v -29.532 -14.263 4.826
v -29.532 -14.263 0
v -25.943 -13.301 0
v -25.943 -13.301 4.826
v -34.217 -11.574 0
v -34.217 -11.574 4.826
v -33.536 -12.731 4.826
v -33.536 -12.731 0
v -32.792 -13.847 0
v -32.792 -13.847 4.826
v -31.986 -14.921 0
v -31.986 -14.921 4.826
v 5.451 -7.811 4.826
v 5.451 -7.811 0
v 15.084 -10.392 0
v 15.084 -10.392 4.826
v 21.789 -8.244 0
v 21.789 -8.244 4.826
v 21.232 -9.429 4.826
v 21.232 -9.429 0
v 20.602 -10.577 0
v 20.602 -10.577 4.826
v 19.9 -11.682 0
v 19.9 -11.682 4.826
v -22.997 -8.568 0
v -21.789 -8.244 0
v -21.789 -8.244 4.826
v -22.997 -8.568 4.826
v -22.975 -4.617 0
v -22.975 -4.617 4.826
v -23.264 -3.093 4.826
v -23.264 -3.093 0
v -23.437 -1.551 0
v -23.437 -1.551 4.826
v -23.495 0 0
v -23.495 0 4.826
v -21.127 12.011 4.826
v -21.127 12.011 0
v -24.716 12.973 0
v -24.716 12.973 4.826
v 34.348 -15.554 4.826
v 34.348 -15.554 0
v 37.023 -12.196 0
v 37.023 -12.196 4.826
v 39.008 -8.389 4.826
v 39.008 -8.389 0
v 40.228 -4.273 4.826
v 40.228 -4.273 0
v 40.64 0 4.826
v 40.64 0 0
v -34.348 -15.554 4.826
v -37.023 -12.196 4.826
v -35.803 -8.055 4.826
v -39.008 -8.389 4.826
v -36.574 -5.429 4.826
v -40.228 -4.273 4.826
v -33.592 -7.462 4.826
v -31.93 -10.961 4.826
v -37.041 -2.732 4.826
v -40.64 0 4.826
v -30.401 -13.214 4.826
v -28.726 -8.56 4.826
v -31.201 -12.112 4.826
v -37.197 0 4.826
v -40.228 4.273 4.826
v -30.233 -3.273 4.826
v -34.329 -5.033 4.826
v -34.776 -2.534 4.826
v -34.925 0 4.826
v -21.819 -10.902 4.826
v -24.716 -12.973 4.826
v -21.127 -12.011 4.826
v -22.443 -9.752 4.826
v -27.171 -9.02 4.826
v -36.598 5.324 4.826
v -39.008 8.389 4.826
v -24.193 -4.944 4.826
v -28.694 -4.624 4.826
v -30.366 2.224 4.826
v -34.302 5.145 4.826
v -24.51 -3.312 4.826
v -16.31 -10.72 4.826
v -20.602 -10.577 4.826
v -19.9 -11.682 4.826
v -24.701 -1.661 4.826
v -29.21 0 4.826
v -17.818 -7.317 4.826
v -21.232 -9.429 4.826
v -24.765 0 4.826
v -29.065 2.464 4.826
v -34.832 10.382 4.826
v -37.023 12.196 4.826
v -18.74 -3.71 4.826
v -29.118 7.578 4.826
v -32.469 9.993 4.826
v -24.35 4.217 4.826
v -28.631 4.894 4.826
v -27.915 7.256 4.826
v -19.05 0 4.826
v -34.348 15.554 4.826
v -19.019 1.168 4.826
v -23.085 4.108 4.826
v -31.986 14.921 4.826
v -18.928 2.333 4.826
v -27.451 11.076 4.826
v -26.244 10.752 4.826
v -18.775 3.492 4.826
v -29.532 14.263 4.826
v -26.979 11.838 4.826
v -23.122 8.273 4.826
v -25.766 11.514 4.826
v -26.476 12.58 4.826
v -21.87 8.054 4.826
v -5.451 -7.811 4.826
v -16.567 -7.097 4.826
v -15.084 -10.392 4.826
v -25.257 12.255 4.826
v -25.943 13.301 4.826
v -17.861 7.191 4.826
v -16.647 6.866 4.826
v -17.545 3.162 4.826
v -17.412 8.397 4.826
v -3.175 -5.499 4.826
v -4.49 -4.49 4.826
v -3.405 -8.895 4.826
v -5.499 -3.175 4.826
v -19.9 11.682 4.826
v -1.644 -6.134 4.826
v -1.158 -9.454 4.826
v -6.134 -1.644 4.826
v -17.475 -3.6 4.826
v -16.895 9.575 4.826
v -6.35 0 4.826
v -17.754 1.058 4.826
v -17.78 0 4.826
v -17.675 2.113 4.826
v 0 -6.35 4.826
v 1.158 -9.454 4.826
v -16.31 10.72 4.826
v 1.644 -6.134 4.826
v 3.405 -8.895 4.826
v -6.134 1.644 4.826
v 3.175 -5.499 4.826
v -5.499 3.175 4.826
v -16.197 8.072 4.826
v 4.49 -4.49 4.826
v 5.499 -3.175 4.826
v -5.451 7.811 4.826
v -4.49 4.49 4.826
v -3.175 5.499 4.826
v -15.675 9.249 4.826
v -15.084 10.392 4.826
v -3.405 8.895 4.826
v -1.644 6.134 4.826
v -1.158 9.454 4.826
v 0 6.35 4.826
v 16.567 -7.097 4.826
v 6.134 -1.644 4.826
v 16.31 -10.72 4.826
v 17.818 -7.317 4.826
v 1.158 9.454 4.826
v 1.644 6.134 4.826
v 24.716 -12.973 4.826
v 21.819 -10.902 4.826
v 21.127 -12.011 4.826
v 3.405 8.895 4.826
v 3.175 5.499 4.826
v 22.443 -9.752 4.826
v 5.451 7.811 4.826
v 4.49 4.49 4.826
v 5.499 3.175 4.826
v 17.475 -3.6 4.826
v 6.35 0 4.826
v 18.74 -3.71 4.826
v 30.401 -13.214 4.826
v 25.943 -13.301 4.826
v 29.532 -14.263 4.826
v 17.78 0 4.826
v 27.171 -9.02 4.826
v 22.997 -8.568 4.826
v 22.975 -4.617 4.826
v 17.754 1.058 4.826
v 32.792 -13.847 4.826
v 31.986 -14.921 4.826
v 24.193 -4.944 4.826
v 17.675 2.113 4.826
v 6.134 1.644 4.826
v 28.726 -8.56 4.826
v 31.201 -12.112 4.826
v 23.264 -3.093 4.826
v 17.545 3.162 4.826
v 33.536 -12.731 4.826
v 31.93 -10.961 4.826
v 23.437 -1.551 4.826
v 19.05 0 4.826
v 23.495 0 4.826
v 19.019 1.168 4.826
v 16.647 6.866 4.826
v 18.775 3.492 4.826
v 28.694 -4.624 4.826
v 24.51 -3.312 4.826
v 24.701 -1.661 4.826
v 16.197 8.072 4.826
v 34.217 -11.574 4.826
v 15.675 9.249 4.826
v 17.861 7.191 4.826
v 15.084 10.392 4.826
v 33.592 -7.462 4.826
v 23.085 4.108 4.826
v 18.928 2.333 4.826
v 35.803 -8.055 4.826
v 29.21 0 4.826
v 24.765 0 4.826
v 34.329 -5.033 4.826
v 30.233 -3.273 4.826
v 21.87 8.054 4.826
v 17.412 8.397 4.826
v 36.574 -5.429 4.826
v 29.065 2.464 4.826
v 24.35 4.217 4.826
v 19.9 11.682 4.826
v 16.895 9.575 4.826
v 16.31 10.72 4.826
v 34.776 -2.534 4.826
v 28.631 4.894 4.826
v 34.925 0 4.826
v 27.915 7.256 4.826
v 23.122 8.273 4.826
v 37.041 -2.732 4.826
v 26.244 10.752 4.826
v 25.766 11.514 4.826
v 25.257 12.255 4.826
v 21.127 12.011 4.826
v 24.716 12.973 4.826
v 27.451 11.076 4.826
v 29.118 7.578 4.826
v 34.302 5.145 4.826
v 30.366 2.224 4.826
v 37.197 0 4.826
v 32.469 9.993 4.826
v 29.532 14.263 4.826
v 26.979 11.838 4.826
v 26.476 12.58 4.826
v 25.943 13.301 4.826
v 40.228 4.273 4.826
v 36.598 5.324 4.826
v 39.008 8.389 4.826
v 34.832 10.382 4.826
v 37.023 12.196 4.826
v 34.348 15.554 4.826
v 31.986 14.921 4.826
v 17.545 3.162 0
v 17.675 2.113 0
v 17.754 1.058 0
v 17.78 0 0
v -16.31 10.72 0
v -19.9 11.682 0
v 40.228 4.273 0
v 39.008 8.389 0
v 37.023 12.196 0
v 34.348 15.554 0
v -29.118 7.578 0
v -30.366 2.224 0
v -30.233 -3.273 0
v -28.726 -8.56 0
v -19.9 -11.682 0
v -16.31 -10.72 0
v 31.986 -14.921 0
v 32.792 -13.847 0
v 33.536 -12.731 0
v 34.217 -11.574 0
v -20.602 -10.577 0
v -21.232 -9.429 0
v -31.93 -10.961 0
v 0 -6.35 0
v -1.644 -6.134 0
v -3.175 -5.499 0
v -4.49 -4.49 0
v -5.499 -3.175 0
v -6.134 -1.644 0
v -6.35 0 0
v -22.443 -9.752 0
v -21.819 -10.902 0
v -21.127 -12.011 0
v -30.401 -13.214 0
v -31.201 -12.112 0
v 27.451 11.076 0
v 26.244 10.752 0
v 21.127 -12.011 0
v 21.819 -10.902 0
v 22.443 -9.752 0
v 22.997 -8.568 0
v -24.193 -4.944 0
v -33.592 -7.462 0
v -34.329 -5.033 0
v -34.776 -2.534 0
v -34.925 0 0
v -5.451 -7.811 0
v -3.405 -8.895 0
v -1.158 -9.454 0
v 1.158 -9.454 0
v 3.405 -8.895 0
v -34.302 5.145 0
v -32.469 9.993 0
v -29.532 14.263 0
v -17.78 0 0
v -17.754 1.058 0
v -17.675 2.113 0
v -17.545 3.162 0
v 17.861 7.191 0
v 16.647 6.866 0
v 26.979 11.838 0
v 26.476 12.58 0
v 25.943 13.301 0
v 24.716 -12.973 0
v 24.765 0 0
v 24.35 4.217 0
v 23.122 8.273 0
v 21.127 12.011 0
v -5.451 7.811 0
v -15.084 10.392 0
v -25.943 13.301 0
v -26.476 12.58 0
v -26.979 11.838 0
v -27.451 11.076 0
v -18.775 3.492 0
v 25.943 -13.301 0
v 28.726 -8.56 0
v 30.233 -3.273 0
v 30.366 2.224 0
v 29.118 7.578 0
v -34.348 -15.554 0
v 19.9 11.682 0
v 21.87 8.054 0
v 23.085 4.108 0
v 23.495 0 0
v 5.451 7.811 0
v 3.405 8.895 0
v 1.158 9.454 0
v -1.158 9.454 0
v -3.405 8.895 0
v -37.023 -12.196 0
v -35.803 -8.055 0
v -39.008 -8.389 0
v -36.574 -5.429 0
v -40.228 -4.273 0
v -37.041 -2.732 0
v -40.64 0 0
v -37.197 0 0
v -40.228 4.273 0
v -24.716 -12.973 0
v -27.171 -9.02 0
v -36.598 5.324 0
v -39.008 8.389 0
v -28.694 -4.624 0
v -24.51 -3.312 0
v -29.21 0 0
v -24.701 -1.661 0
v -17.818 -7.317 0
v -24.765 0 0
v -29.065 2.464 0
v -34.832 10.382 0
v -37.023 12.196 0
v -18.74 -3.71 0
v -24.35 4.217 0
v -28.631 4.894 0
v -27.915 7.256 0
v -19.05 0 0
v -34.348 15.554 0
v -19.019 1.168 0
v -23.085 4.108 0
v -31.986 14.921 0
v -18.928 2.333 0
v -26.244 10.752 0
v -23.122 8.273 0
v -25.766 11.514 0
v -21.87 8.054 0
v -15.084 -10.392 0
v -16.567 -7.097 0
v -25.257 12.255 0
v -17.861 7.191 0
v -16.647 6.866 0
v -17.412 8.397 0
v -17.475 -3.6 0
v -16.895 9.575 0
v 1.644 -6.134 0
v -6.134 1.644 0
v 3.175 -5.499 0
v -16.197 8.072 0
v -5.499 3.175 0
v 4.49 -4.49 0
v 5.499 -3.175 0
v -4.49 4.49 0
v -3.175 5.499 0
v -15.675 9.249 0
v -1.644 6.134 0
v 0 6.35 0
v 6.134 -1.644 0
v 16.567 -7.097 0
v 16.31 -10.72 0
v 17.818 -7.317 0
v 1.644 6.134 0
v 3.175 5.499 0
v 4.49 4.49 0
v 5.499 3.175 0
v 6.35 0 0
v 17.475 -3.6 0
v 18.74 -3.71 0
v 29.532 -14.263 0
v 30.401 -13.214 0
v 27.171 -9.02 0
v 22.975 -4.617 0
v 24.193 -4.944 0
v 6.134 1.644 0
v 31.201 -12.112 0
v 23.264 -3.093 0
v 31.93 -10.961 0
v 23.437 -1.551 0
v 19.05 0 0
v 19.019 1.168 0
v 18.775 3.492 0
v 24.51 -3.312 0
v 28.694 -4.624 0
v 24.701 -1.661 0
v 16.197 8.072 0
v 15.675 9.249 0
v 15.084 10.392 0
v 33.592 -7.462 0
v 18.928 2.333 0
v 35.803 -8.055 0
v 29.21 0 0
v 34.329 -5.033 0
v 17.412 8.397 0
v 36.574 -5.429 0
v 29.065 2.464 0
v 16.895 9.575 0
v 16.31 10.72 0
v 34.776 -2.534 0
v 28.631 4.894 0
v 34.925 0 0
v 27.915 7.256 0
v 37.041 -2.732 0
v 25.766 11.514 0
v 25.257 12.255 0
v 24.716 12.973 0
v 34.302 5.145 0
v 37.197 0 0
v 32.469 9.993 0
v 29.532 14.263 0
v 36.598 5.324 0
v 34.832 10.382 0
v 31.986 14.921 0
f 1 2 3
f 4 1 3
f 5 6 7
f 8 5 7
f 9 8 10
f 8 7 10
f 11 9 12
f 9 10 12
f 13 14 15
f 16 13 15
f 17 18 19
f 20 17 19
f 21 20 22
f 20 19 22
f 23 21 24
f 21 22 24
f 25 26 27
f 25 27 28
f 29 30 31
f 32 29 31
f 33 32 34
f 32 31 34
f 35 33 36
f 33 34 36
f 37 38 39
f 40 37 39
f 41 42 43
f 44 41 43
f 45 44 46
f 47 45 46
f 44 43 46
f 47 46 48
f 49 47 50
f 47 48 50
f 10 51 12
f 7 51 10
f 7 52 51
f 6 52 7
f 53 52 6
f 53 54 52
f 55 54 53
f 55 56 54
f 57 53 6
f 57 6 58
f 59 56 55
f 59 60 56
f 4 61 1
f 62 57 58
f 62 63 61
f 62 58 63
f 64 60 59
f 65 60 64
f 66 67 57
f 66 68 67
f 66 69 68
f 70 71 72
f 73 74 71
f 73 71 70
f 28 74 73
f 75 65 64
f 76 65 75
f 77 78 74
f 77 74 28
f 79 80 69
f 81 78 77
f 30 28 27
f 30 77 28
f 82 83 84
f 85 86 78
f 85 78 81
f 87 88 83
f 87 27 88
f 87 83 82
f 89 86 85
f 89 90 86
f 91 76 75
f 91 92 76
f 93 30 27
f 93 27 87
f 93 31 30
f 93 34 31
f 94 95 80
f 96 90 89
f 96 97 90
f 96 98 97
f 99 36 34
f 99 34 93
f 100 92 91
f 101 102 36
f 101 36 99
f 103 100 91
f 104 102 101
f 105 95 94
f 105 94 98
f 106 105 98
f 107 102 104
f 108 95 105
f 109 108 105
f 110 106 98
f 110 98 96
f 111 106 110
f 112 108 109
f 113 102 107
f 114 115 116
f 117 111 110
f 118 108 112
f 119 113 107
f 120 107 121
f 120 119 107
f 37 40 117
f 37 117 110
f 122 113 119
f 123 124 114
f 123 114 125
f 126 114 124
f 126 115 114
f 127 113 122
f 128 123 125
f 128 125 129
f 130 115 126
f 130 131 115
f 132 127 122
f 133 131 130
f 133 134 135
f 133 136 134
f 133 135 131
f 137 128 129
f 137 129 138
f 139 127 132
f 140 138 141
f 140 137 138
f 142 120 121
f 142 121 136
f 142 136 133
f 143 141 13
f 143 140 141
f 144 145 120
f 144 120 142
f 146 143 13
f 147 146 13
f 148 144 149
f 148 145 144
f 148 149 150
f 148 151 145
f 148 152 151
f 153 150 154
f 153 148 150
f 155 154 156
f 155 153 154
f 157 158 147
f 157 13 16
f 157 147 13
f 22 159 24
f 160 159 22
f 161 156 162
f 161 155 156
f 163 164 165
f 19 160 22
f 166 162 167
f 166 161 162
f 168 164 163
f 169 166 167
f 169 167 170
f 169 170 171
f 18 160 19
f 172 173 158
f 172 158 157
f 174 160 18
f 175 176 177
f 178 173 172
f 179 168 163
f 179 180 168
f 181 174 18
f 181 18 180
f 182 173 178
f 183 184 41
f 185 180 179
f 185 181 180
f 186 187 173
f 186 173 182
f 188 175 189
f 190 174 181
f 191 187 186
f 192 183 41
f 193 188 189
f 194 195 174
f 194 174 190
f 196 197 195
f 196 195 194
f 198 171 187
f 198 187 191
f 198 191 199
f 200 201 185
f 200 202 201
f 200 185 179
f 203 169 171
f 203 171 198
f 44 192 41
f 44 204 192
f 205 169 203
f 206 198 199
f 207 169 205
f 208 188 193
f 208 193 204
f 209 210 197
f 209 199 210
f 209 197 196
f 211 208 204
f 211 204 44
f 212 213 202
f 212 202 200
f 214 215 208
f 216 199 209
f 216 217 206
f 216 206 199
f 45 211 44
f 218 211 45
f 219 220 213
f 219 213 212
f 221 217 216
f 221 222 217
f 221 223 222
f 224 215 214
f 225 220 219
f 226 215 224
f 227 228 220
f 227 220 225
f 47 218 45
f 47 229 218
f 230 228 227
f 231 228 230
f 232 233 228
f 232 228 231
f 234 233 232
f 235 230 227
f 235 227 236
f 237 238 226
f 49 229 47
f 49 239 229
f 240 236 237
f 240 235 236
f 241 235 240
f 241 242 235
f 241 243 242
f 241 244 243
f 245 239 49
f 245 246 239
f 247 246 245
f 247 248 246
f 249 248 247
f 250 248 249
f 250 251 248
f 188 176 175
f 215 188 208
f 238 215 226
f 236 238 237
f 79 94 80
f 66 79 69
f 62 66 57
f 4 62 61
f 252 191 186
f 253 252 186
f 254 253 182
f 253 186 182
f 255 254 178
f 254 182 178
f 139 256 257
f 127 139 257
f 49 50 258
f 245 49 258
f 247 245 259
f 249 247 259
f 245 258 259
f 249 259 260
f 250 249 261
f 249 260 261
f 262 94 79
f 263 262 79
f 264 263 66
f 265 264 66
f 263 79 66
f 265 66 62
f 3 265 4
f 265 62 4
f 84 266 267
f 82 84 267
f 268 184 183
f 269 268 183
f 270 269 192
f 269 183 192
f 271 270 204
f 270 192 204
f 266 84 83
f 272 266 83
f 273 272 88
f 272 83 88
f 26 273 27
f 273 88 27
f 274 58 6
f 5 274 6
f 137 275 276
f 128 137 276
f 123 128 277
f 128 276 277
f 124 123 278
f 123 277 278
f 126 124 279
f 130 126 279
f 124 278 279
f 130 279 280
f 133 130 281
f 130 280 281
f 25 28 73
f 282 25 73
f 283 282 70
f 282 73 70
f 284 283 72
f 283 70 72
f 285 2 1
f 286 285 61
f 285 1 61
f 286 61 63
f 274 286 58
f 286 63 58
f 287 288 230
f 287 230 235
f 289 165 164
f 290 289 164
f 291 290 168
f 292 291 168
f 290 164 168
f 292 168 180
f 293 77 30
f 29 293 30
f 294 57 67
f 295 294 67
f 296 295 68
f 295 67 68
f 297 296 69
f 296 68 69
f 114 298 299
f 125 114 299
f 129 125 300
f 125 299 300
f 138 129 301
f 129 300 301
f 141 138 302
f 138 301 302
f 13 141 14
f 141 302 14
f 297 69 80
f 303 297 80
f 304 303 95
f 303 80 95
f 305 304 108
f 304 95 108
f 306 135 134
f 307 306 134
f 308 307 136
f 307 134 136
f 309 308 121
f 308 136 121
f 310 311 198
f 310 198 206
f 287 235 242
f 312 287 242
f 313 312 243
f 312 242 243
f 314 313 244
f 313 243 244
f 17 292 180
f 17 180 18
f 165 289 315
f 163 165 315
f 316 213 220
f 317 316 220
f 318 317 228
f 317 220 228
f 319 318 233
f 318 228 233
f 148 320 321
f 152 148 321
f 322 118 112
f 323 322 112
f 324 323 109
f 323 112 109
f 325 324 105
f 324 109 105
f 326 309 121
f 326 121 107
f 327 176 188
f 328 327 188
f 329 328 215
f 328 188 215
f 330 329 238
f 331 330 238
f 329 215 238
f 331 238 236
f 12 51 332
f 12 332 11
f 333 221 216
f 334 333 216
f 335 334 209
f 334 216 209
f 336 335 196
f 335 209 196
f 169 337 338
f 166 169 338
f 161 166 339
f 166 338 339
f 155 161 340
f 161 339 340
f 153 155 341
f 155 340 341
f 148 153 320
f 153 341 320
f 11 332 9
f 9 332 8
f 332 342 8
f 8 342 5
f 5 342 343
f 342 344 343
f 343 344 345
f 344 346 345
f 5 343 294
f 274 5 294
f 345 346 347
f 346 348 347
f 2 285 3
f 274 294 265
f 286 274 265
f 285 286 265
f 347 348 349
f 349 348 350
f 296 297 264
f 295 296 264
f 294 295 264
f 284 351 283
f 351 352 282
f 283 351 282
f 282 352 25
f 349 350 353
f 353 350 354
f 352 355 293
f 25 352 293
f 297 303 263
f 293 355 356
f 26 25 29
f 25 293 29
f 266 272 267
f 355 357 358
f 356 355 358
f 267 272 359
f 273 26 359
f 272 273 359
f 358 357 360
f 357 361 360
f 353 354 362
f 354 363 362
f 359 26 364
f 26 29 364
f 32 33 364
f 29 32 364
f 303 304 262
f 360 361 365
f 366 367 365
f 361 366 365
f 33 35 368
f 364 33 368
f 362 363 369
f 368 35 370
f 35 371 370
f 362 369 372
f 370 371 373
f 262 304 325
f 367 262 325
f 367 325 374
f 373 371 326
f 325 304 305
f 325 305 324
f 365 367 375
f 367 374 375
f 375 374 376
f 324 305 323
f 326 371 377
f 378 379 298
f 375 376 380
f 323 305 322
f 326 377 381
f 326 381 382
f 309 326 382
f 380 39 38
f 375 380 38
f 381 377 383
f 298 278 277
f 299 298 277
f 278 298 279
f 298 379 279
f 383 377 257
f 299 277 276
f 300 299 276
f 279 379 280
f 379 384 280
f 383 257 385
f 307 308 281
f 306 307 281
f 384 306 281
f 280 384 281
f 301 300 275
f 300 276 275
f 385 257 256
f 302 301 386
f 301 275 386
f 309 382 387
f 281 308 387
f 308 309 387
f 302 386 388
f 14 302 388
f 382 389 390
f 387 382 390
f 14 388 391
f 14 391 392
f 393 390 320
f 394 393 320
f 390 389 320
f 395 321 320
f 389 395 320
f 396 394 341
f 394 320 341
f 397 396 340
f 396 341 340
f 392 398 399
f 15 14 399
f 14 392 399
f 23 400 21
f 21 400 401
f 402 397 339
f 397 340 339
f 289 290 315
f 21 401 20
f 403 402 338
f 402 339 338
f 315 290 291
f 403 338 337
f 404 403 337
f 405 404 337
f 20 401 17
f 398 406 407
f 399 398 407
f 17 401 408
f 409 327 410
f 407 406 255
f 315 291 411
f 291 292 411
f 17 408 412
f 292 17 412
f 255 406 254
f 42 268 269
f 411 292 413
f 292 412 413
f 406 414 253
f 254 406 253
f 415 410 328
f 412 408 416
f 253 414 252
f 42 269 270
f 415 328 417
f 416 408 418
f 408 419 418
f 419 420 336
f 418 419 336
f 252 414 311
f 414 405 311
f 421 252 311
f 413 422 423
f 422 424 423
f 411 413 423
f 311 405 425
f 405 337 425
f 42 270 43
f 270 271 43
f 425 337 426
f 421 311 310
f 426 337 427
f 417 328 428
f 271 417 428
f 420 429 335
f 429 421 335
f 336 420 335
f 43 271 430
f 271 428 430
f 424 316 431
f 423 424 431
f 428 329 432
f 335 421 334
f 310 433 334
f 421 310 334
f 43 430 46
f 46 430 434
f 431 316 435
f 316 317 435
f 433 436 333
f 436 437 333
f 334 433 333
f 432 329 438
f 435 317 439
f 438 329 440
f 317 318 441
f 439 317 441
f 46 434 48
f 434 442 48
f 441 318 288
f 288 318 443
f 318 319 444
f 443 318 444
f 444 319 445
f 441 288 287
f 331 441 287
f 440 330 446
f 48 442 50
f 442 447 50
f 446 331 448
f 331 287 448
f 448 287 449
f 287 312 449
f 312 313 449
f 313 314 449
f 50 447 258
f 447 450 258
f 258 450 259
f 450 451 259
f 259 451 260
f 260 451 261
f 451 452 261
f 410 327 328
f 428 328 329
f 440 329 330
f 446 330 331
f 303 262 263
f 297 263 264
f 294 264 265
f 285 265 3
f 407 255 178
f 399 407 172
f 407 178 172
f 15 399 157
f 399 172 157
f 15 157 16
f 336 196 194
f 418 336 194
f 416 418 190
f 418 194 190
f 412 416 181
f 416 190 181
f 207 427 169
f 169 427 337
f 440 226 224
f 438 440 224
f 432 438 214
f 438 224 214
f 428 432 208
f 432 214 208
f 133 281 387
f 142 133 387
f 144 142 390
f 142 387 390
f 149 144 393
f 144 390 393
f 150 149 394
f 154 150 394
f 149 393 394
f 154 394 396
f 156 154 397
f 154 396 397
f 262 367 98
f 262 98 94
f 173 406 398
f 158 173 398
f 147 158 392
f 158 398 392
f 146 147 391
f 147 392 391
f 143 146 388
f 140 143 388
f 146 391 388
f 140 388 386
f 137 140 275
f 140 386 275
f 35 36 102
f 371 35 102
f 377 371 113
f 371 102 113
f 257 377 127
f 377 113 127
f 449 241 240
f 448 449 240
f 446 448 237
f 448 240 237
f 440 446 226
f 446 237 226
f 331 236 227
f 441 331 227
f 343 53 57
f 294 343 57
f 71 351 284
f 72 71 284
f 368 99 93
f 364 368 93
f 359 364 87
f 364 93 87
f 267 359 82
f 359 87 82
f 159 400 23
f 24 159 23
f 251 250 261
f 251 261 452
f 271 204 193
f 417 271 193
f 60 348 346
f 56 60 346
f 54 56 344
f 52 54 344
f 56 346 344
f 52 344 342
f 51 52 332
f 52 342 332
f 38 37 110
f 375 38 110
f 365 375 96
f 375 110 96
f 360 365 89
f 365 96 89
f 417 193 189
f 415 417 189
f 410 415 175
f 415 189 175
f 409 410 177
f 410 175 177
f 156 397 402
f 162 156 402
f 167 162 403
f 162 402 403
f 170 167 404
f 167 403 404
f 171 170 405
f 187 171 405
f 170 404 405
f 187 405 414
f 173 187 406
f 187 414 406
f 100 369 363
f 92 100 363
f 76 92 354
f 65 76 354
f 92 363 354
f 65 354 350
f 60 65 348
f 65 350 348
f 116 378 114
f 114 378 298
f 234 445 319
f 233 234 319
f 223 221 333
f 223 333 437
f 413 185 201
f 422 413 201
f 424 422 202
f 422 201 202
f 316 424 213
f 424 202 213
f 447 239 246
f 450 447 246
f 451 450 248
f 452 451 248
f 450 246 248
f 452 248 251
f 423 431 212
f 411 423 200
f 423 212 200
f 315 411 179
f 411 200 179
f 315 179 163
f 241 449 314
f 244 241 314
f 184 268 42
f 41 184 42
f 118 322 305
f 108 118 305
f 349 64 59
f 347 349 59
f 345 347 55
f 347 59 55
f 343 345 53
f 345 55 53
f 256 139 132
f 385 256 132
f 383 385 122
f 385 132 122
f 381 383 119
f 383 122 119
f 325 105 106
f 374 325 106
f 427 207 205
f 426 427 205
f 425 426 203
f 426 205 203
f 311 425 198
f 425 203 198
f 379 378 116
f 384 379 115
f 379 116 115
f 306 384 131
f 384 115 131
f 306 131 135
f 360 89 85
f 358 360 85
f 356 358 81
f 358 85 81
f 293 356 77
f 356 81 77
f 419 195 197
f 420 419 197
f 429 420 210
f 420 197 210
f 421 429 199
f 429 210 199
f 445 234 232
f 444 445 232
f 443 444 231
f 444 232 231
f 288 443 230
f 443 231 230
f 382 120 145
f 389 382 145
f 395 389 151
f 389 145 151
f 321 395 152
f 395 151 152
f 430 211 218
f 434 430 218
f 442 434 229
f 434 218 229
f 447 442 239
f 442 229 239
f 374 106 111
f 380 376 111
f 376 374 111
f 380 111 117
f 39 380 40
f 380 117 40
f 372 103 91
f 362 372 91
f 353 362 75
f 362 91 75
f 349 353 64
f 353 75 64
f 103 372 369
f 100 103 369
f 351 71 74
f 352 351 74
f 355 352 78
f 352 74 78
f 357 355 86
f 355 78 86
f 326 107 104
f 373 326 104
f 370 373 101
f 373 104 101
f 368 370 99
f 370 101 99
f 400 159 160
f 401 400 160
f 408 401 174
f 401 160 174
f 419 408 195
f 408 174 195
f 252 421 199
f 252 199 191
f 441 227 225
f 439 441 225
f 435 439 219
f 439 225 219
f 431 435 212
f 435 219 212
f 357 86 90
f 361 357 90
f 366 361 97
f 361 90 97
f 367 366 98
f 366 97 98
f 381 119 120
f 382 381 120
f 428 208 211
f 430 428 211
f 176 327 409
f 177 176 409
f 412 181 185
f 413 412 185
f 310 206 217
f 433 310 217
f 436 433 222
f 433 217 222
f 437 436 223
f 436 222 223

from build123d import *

# Parameters (mm, degrees)
F1_DEPTH = 4.826
F3_DEPTH = 25.4


with BuildPart() as f1:
    # F0 (on Top) → F1 (new body)
    with BuildSketch(Plane.XY):
        with BuildLine():
            Line((9.525, 0), (6.35, 0))
            ThreePointArc((6.35, 0), (4.4901280605, -4.4901280605), (0, -6.35))
            Line((0, -6.35), (5.4514567473, -7.810713433))
            ThreePointArc((5.4514567473, -7.810713433), (8.4454351729, -4.4045714594), (9.525, 0))
        make_face()
        with BuildLine():
            ThreePointArc((0, 6.35), (4.4901280605, 4.4901280605), (6.35, 0))
            Line((6.35, 0), (9.525, 0))
            ThreePointArc((9.525, 0), (8.4454351729, 4.4045714594), (5.4514567473, 7.810713433))
            Line((5.4514567473, 7.810713433), (0, 6.35))
        make_face()
        with BuildLine():
            Line((-5.4514567473, 7.810713433), (0, 6.35))
            Line((0, 6.35), (5.4514567473, 7.810713433))
            ThreePointArc((5.4514567473, 7.810713433), (0, 9.525), (-5.4514567473, 7.810713433))
        make_face()
        with BuildLine():
            ThreePointArc((-6.35, 0), (-4.4901280605, 4.4901280605), (0, 6.35))
            Line((0, 6.35), (-5.4514567473, 7.810713433))
            ThreePointArc((-5.4514567473, 7.810713433), (-8.4454351729, 4.4045714594), (-9.525, 0))
            Line((-9.525, 0), (-6.35, 0))
        make_face()
        with BuildLine():
            Line((-5.4514567473, -7.810713433), (0, -6.35))
            ThreePointArc((0, -6.35), (-4.4901280605, -4.4901280605), (-6.35, 0))
            Line((-6.35, 0), (-9.525, 0))
            ThreePointArc((-9.525, 0), (-8.4454351729, -4.4045714594), (-5.4514567473, -7.810713433))
        make_face()
        with BuildLine():
            Line((5.4514567473, -7.810713433), (0, -6.35))
            Line((0, -6.35), (-5.4514567473, -7.810713433))
            ThreePointArc((-5.4514567473, -7.810713433), (0, -9.525), (5.4514567473, -7.810713433))
        make_face()
        with BuildLine():
            Line((40.64, 0), (9.525, 0))
            ThreePointArc((9.525, 0), (8.4454351729, -4.4045714594), (5.4514567473, -7.810713433))
            Line((5.4514567473, -7.810713433), (34.3483223828, -15.5536052438))
            ThreePointArc((34.3483223828, -15.5536052438), (39.0075163, -8.3889785332), (40.64, 0))
        make_face()
        with BuildLine():
            ThreePointArc((5.4514567473, 7.810713433), (8.4454351729, 4.4045714594), (9.525, 0))
            Line((9.525, 0), (40.64, 0))
            ThreePointArc((40.64, 0), (39.0075163, 8.3889785332), (34.3483223828, 15.5536052438))
            Line((34.3483223828, 15.5536052438), (5.4514567473, 7.810713433))
        make_face()
        with BuildLine():
            ThreePointArc((-9.525, 0), (-8.4454351729, 4.4045714594), (-5.4514567473, 7.810713433))
            Line((-5.4514567473, 7.810713433), (-34.3483223828, 15.5536052438))
            ThreePointArc((-34.3483223828, 15.5536052438), (-39.0075163, 8.3889785332), (-40.64, 0))
            Line((-40.64, 0), (-9.525, 0))
        make_face()
        with BuildLine():
            Line((-34.3483223828, -15.5536052438), (-5.4514567473, -7.810713433))
            ThreePointArc((-5.4514567473, -7.810713433), (-8.4454351729, -4.4045714594), (-9.525, 0))
            Line((-9.525, 0), (-40.64, 0))
            ThreePointArc((-40.64, 0), (-39.0075163, -8.3889785332), (-34.3483223828, -15.5536052438))
        make_face()
    extrude(amount=F1_DEPTH)

    # F2 (on face) → F3 (cut)
    with BuildSketch(Plane.XY.offset(4.826)):
        with BuildLine():
            ThreePointArc((-33.5923079354, -7.4622272885), (-34.5892118857, -3.7901485539), (-34.925, 0))
            Line((-34.925, 0), (-37.1971782011, 0))
            ThreePointArc((-37.1971782011, 0), (-36.846066564, -4.0871759774), (-35.8030202404, -8.0545858653))
            Line((-35.8030202404, -8.0545858653), (-33.5923079354, -7.4622272885))
        make_face()
        with BuildLine():
            Line((-37.1971782011, 0), (-34.925, 0))
            ThreePointArc((-34.925, 0), (-33.5317746734, 7.6242904379), (-29.532176449, 14.2631228302))
            Line((-29.532176449, 14.2631228302), (-31.9856280478, 14.9205232048))
            ThreePointArc((-31.9856280478, 14.9205232048), (-35.8568057684, 7.9022507507), (-37.1971782011, 0))
        make_face()
        with BuildLine():
            Line((-31.9856280478, -14.9205232048), (-29.532176449, -14.2631228302))
            ThreePointArc((-29.532176449, -14.2631228302), (-30.8095695693, -12.6690899076), (-31.930357985, -10.9613113888))
            Line((-31.930357985, -10.9613113888), (-34.2169264562, -11.5739955641))
            ThreePointArc((-34.2169264562, -11.5739955641), (-33.1716116897, -13.294154894), (-31.9856280478, -14.9205232048))
        make_face()
        with BuildLine():
            ThreePointArc((-24.7160305152, -12.9726404166), (-28.0546836255, -6.8644949033), (-29.21, 0))
            Line((-29.21, 0), (-30.48, 0))
            ThreePointArc((-30.48, 0), (-29.3144832952, -7.0269524355), (-25.9427563146, -13.3013406039))
            Line((-25.9427563146, -13.3013406039), (-24.7160305152, -12.9726404166))
        make_face()
        with BuildLine():
            ThreePointArc((-26.2436859957, 10.7523729707), (-25.5155620849, 11.887072721), (-24.7160305152, 12.9726404166))
            Line((-24.7160305152, 12.9726404166), (-25.9427563146, 13.3013406039))
            ThreePointArc((-25.9427563146, 13.3013406039), (-26.731347274, 12.2119381475), (-27.4511523902, 11.075912616))
            Line((-27.4511523902, 11.075912616), (-26.2436859957, 10.7523729707))
        make_face()
        with BuildLine():
            Line((-30.48, 0), (-29.21, 0))
            ThreePointArc((-29.21, 0), (-28.8836587626, 3.6852190858), (-27.9147918493, 7.2557421873))
            Line((-27.9147918493, 7.2557421873), (-29.1181427694, 7.5781790945))
            ThreePointArc((-29.1181427694, 7.5781790945), (-30.1368303905, 3.8497874456), (-30.48, 0))
        make_face()
        with BuildLine():
            Line((-24.765, 0), (-23.495, 0))
            ThreePointArc((-23.495, 0), (-22.5758928334, 6.1114169896), (-19.8998845814, 11.6821580031))
            Line((-19.8998845814, 11.6821580031), (-21.1266103808, 12.0108581903))
            ThreePointArc((-21.1266103808, 12.0108581903), (-23.8354414226, 6.2749221806), (-24.765, 0))
        make_face()
        with BuildLine():
            ThreePointArc((-22.975438781, -4.6174457724), (-23.3647011405, -2.3232923472), (-23.495, 0))
            Line((-23.495, 0), (-24.765, 0))
            ThreePointArc((-24.765, 0), (-24.6214878009, -2.4883246732), (-24.192854341, -4.9436512885))
            Line((-24.192854341, -4.9436512885), (-22.975438781, -4.6174457724))
        make_face()
        with BuildLine():
            Line((-21.1266103808, -12.0108581903), (-19.8998845814, -11.6821580031))
            ThreePointArc((-19.8998845814, -11.6821580031), (-20.9260158473, -10.0078144461), (-21.789494801, -8.2440752881))
            Line((-21.789494801, -8.2440752881), (-22.9970709968, -8.5676443545))
            ThreePointArc((-22.9970709968, -8.5676443545), (-22.1399215448, -10.3316672167), (-21.1266103808, -12.0108581903))
        make_face()
        with BuildLine():
            ThreePointArc((-15.0837386475, -10.3916755895), (-17.09495644, -5.3678847519), (-17.78, 0))
            Line((-17.78, 0), (-19.05, 0))
            ThreePointArc((-19.05, 0), (-18.354285684, -5.5324386992), (-16.3104644469, -10.7203757767))
            Line((-16.3104644469, -10.7203757767), (-15.0837386475, -10.3916755895))
        make_face()
        with BuildLine():
            Line((-19.05, 0), (-17.78, 0))
            ThreePointArc((-17.78, 0), (-17.7211105613, 1.5855193171), (-17.544766757, 3.1623015892))
            Line((-17.544766757, 3.1623015892), (-18.7754484951, 3.4920617671))
            ThreePointArc((-18.7754484951, 3.4920617671), (-18.9812563815, 1.75141899), (-19.05, 0))
        make_face()
        with BuildLine():
            Line((-17.8611435758, 7.1914767497), (-16.6471026371, 6.8661754606))
            ThreePointArc((-16.6471026371, 6.8661754606), (-15.9451000092, 8.6642589099), (-15.0837386475, 10.3916755895))
            Line((-15.0837386475, 10.3916755895), (-16.3104644469, 10.7203757767))
            ThreePointArc((-16.3104644469, 10.7203757767), (-17.1620380999, 8.9894252693), (-17.8611435758, 7.1914767497))
        make_face()
        with BuildLine():
            Line((19.05, 0), (17.78, 0))
            ThreePointArc((17.78, 0), (17.09495644, -5.3678847519), (15.0837386475, -10.3916755895))
            Line((15.0837386475, -10.3916755895), (16.3104644469, -10.7203757767))
            ThreePointArc((16.3104644469, -10.7203757767), (18.354285684, -5.5324386992), (19.05, 0))
        make_face()
        with BuildLine():
            ThreePointArc((17.544766757, 3.1623015892), (17.7211105613, 1.5855193171), (17.78, 0))
            Line((17.78, 0), (19.05, 0))
            ThreePointArc((19.05, 0), (18.9812563815, 1.75141899), (18.7754484951, 3.4920617671))
            Line((18.7754484951, 3.4920617671), (17.544766757, 3.1623015892))
        make_face()
        with BuildLine():
            ThreePointArc((15.0837386475, 10.3916755895), (15.9451000092, 8.6642589099), (16.6471026371, 6.8661754606))
            Line((16.6471026371, 6.8661754606), (17.8611435758, 7.1914767497))
            ThreePointArc((17.8611435758, 7.1914767497), (17.1620380999, 8.9894252693), (16.3104644469, 10.7203757767))
            Line((16.3104644469, 10.7203757767), (15.0837386475, 10.3916755895))
        make_face()
        with BuildLine():
            ThreePointArc((19.8998845814, 11.6821580031), (22.5758928334, 6.1114169896), (23.495, 0))
            Line((23.495, 0), (24.765, 0))
            ThreePointArc((24.765, 0), (23.8354414226, 6.2749221806), (21.1266103808, 12.0108581903))
            Line((21.1266103808, 12.0108581903), (19.8998845814, 11.6821580031))
        make_face()
        with BuildLine():
            Line((24.765, 0), (23.495, 0))
            ThreePointArc((23.495, 0), (23.3647011405, -2.3232923472), (22.975438781, -4.6174457724))
            Line((22.975438781, -4.6174457724), (24.192854341, -4.9436512885))
            ThreePointArc((24.192854341, -4.9436512885), (24.6214878009, -2.4883246732), (24.765, 0))
        make_face()
        with BuildLine():
            ThreePointArc((21.789494801, -8.2440752881), (20.9260158473, -10.0078144461), (19.8998845814, -11.6821580031))
            Line((19.8998845814, -11.6821580031), (21.1266103808, -12.0108581903))
            ThreePointArc((21.1266103808, -12.0108581903), (22.1399215448, -10.3316672167), (22.9970709968, -8.5676443545))
            Line((22.9970709968, -8.5676443545), (21.789494801, -8.2440752881))
        make_face()
        with BuildLine():
            Line((30.48, 0), (29.21, 0))
            ThreePointArc((29.21, 0), (28.0546836255, -6.8644949033), (24.7160305152, -12.9726404166))
            Line((24.7160305152, -12.9726404166), (25.9427563146, -13.3013406039))
            ThreePointArc((25.9427563146, -13.3013406039), (29.3144832952, -7.0269524355), (30.48, 0))
        make_face()
        with BuildLine():
            ThreePointArc((27.9147918493, 7.2557421873), (28.8836587626, 3.6852190858), (29.21, 0))
            Line((29.21, 0), (30.48, 0))
            ThreePointArc((30.48, 0), (30.1368303905, 3.8497874456), (29.1181427694, 7.5781790945))
            Line((29.1181427694, 7.5781790945), (27.9147918493, 7.2557421873))
        make_face()
        with BuildLine():
            Line((25.9427563146, 13.3013406039), (24.7160305152, 12.9726404166))
            ThreePointArc((24.7160305152, 12.9726404166), (25.5155620849, 11.887072721), (26.2436859957, 10.7523729707))
            Line((26.2436859957, 10.7523729707), (27.4511523902, 11.075912616))
            ThreePointArc((27.4511523902, 11.075912616), (26.731347274, 12.2119381475), (25.9427563146, 13.3013406039))
        make_face()
        with BuildLine():
            ThreePointArc((29.532176449, 14.2631228302), (33.5317746734, 7.6242904379), (34.925, 0))
            Line((34.925, 0), (37.1971782011, 0))
            ThreePointArc((37.1971782011, 0), (35.8568057684, 7.9022507507), (31.9856280478, 14.9205232048))
            Line((31.9856280478, 14.9205232048), (29.532176449, 14.2631228302))
        make_face()
        with BuildLine():
            Line((37.1971782011, 0), (34.925, 0))
            ThreePointArc((34.925, 0), (34.5892118857, -3.7901485539), (33.5923079354, -7.4622272885))
            Line((33.5923079354, -7.4622272885), (35.8030202404, -8.0545858653))
            ThreePointArc((35.8030202404, -8.0545858653), (36.846066564, -4.0871759774), (37.1971782011, 0))
        make_face()
        with BuildLine():
            ThreePointArc((31.930357985, -10.9613113888), (30.8095695693, -12.6690899076), (29.532176449, -14.2631228302))
            Line((29.532176449, -14.2631228302), (31.9856280478, -14.9205232048))
            ThreePointArc((31.9856280478, -14.9205232048), (33.1716116897, -13.294154894), (34.2169264562, -11.5739955641))
            Line((34.2169264562, -11.5739955641), (31.930357985, -10.9613113888))
        make_face()
    extrude(amount=-F3_DEPTH, mode=Mode.SUBTRACT)


solid = f1.part
